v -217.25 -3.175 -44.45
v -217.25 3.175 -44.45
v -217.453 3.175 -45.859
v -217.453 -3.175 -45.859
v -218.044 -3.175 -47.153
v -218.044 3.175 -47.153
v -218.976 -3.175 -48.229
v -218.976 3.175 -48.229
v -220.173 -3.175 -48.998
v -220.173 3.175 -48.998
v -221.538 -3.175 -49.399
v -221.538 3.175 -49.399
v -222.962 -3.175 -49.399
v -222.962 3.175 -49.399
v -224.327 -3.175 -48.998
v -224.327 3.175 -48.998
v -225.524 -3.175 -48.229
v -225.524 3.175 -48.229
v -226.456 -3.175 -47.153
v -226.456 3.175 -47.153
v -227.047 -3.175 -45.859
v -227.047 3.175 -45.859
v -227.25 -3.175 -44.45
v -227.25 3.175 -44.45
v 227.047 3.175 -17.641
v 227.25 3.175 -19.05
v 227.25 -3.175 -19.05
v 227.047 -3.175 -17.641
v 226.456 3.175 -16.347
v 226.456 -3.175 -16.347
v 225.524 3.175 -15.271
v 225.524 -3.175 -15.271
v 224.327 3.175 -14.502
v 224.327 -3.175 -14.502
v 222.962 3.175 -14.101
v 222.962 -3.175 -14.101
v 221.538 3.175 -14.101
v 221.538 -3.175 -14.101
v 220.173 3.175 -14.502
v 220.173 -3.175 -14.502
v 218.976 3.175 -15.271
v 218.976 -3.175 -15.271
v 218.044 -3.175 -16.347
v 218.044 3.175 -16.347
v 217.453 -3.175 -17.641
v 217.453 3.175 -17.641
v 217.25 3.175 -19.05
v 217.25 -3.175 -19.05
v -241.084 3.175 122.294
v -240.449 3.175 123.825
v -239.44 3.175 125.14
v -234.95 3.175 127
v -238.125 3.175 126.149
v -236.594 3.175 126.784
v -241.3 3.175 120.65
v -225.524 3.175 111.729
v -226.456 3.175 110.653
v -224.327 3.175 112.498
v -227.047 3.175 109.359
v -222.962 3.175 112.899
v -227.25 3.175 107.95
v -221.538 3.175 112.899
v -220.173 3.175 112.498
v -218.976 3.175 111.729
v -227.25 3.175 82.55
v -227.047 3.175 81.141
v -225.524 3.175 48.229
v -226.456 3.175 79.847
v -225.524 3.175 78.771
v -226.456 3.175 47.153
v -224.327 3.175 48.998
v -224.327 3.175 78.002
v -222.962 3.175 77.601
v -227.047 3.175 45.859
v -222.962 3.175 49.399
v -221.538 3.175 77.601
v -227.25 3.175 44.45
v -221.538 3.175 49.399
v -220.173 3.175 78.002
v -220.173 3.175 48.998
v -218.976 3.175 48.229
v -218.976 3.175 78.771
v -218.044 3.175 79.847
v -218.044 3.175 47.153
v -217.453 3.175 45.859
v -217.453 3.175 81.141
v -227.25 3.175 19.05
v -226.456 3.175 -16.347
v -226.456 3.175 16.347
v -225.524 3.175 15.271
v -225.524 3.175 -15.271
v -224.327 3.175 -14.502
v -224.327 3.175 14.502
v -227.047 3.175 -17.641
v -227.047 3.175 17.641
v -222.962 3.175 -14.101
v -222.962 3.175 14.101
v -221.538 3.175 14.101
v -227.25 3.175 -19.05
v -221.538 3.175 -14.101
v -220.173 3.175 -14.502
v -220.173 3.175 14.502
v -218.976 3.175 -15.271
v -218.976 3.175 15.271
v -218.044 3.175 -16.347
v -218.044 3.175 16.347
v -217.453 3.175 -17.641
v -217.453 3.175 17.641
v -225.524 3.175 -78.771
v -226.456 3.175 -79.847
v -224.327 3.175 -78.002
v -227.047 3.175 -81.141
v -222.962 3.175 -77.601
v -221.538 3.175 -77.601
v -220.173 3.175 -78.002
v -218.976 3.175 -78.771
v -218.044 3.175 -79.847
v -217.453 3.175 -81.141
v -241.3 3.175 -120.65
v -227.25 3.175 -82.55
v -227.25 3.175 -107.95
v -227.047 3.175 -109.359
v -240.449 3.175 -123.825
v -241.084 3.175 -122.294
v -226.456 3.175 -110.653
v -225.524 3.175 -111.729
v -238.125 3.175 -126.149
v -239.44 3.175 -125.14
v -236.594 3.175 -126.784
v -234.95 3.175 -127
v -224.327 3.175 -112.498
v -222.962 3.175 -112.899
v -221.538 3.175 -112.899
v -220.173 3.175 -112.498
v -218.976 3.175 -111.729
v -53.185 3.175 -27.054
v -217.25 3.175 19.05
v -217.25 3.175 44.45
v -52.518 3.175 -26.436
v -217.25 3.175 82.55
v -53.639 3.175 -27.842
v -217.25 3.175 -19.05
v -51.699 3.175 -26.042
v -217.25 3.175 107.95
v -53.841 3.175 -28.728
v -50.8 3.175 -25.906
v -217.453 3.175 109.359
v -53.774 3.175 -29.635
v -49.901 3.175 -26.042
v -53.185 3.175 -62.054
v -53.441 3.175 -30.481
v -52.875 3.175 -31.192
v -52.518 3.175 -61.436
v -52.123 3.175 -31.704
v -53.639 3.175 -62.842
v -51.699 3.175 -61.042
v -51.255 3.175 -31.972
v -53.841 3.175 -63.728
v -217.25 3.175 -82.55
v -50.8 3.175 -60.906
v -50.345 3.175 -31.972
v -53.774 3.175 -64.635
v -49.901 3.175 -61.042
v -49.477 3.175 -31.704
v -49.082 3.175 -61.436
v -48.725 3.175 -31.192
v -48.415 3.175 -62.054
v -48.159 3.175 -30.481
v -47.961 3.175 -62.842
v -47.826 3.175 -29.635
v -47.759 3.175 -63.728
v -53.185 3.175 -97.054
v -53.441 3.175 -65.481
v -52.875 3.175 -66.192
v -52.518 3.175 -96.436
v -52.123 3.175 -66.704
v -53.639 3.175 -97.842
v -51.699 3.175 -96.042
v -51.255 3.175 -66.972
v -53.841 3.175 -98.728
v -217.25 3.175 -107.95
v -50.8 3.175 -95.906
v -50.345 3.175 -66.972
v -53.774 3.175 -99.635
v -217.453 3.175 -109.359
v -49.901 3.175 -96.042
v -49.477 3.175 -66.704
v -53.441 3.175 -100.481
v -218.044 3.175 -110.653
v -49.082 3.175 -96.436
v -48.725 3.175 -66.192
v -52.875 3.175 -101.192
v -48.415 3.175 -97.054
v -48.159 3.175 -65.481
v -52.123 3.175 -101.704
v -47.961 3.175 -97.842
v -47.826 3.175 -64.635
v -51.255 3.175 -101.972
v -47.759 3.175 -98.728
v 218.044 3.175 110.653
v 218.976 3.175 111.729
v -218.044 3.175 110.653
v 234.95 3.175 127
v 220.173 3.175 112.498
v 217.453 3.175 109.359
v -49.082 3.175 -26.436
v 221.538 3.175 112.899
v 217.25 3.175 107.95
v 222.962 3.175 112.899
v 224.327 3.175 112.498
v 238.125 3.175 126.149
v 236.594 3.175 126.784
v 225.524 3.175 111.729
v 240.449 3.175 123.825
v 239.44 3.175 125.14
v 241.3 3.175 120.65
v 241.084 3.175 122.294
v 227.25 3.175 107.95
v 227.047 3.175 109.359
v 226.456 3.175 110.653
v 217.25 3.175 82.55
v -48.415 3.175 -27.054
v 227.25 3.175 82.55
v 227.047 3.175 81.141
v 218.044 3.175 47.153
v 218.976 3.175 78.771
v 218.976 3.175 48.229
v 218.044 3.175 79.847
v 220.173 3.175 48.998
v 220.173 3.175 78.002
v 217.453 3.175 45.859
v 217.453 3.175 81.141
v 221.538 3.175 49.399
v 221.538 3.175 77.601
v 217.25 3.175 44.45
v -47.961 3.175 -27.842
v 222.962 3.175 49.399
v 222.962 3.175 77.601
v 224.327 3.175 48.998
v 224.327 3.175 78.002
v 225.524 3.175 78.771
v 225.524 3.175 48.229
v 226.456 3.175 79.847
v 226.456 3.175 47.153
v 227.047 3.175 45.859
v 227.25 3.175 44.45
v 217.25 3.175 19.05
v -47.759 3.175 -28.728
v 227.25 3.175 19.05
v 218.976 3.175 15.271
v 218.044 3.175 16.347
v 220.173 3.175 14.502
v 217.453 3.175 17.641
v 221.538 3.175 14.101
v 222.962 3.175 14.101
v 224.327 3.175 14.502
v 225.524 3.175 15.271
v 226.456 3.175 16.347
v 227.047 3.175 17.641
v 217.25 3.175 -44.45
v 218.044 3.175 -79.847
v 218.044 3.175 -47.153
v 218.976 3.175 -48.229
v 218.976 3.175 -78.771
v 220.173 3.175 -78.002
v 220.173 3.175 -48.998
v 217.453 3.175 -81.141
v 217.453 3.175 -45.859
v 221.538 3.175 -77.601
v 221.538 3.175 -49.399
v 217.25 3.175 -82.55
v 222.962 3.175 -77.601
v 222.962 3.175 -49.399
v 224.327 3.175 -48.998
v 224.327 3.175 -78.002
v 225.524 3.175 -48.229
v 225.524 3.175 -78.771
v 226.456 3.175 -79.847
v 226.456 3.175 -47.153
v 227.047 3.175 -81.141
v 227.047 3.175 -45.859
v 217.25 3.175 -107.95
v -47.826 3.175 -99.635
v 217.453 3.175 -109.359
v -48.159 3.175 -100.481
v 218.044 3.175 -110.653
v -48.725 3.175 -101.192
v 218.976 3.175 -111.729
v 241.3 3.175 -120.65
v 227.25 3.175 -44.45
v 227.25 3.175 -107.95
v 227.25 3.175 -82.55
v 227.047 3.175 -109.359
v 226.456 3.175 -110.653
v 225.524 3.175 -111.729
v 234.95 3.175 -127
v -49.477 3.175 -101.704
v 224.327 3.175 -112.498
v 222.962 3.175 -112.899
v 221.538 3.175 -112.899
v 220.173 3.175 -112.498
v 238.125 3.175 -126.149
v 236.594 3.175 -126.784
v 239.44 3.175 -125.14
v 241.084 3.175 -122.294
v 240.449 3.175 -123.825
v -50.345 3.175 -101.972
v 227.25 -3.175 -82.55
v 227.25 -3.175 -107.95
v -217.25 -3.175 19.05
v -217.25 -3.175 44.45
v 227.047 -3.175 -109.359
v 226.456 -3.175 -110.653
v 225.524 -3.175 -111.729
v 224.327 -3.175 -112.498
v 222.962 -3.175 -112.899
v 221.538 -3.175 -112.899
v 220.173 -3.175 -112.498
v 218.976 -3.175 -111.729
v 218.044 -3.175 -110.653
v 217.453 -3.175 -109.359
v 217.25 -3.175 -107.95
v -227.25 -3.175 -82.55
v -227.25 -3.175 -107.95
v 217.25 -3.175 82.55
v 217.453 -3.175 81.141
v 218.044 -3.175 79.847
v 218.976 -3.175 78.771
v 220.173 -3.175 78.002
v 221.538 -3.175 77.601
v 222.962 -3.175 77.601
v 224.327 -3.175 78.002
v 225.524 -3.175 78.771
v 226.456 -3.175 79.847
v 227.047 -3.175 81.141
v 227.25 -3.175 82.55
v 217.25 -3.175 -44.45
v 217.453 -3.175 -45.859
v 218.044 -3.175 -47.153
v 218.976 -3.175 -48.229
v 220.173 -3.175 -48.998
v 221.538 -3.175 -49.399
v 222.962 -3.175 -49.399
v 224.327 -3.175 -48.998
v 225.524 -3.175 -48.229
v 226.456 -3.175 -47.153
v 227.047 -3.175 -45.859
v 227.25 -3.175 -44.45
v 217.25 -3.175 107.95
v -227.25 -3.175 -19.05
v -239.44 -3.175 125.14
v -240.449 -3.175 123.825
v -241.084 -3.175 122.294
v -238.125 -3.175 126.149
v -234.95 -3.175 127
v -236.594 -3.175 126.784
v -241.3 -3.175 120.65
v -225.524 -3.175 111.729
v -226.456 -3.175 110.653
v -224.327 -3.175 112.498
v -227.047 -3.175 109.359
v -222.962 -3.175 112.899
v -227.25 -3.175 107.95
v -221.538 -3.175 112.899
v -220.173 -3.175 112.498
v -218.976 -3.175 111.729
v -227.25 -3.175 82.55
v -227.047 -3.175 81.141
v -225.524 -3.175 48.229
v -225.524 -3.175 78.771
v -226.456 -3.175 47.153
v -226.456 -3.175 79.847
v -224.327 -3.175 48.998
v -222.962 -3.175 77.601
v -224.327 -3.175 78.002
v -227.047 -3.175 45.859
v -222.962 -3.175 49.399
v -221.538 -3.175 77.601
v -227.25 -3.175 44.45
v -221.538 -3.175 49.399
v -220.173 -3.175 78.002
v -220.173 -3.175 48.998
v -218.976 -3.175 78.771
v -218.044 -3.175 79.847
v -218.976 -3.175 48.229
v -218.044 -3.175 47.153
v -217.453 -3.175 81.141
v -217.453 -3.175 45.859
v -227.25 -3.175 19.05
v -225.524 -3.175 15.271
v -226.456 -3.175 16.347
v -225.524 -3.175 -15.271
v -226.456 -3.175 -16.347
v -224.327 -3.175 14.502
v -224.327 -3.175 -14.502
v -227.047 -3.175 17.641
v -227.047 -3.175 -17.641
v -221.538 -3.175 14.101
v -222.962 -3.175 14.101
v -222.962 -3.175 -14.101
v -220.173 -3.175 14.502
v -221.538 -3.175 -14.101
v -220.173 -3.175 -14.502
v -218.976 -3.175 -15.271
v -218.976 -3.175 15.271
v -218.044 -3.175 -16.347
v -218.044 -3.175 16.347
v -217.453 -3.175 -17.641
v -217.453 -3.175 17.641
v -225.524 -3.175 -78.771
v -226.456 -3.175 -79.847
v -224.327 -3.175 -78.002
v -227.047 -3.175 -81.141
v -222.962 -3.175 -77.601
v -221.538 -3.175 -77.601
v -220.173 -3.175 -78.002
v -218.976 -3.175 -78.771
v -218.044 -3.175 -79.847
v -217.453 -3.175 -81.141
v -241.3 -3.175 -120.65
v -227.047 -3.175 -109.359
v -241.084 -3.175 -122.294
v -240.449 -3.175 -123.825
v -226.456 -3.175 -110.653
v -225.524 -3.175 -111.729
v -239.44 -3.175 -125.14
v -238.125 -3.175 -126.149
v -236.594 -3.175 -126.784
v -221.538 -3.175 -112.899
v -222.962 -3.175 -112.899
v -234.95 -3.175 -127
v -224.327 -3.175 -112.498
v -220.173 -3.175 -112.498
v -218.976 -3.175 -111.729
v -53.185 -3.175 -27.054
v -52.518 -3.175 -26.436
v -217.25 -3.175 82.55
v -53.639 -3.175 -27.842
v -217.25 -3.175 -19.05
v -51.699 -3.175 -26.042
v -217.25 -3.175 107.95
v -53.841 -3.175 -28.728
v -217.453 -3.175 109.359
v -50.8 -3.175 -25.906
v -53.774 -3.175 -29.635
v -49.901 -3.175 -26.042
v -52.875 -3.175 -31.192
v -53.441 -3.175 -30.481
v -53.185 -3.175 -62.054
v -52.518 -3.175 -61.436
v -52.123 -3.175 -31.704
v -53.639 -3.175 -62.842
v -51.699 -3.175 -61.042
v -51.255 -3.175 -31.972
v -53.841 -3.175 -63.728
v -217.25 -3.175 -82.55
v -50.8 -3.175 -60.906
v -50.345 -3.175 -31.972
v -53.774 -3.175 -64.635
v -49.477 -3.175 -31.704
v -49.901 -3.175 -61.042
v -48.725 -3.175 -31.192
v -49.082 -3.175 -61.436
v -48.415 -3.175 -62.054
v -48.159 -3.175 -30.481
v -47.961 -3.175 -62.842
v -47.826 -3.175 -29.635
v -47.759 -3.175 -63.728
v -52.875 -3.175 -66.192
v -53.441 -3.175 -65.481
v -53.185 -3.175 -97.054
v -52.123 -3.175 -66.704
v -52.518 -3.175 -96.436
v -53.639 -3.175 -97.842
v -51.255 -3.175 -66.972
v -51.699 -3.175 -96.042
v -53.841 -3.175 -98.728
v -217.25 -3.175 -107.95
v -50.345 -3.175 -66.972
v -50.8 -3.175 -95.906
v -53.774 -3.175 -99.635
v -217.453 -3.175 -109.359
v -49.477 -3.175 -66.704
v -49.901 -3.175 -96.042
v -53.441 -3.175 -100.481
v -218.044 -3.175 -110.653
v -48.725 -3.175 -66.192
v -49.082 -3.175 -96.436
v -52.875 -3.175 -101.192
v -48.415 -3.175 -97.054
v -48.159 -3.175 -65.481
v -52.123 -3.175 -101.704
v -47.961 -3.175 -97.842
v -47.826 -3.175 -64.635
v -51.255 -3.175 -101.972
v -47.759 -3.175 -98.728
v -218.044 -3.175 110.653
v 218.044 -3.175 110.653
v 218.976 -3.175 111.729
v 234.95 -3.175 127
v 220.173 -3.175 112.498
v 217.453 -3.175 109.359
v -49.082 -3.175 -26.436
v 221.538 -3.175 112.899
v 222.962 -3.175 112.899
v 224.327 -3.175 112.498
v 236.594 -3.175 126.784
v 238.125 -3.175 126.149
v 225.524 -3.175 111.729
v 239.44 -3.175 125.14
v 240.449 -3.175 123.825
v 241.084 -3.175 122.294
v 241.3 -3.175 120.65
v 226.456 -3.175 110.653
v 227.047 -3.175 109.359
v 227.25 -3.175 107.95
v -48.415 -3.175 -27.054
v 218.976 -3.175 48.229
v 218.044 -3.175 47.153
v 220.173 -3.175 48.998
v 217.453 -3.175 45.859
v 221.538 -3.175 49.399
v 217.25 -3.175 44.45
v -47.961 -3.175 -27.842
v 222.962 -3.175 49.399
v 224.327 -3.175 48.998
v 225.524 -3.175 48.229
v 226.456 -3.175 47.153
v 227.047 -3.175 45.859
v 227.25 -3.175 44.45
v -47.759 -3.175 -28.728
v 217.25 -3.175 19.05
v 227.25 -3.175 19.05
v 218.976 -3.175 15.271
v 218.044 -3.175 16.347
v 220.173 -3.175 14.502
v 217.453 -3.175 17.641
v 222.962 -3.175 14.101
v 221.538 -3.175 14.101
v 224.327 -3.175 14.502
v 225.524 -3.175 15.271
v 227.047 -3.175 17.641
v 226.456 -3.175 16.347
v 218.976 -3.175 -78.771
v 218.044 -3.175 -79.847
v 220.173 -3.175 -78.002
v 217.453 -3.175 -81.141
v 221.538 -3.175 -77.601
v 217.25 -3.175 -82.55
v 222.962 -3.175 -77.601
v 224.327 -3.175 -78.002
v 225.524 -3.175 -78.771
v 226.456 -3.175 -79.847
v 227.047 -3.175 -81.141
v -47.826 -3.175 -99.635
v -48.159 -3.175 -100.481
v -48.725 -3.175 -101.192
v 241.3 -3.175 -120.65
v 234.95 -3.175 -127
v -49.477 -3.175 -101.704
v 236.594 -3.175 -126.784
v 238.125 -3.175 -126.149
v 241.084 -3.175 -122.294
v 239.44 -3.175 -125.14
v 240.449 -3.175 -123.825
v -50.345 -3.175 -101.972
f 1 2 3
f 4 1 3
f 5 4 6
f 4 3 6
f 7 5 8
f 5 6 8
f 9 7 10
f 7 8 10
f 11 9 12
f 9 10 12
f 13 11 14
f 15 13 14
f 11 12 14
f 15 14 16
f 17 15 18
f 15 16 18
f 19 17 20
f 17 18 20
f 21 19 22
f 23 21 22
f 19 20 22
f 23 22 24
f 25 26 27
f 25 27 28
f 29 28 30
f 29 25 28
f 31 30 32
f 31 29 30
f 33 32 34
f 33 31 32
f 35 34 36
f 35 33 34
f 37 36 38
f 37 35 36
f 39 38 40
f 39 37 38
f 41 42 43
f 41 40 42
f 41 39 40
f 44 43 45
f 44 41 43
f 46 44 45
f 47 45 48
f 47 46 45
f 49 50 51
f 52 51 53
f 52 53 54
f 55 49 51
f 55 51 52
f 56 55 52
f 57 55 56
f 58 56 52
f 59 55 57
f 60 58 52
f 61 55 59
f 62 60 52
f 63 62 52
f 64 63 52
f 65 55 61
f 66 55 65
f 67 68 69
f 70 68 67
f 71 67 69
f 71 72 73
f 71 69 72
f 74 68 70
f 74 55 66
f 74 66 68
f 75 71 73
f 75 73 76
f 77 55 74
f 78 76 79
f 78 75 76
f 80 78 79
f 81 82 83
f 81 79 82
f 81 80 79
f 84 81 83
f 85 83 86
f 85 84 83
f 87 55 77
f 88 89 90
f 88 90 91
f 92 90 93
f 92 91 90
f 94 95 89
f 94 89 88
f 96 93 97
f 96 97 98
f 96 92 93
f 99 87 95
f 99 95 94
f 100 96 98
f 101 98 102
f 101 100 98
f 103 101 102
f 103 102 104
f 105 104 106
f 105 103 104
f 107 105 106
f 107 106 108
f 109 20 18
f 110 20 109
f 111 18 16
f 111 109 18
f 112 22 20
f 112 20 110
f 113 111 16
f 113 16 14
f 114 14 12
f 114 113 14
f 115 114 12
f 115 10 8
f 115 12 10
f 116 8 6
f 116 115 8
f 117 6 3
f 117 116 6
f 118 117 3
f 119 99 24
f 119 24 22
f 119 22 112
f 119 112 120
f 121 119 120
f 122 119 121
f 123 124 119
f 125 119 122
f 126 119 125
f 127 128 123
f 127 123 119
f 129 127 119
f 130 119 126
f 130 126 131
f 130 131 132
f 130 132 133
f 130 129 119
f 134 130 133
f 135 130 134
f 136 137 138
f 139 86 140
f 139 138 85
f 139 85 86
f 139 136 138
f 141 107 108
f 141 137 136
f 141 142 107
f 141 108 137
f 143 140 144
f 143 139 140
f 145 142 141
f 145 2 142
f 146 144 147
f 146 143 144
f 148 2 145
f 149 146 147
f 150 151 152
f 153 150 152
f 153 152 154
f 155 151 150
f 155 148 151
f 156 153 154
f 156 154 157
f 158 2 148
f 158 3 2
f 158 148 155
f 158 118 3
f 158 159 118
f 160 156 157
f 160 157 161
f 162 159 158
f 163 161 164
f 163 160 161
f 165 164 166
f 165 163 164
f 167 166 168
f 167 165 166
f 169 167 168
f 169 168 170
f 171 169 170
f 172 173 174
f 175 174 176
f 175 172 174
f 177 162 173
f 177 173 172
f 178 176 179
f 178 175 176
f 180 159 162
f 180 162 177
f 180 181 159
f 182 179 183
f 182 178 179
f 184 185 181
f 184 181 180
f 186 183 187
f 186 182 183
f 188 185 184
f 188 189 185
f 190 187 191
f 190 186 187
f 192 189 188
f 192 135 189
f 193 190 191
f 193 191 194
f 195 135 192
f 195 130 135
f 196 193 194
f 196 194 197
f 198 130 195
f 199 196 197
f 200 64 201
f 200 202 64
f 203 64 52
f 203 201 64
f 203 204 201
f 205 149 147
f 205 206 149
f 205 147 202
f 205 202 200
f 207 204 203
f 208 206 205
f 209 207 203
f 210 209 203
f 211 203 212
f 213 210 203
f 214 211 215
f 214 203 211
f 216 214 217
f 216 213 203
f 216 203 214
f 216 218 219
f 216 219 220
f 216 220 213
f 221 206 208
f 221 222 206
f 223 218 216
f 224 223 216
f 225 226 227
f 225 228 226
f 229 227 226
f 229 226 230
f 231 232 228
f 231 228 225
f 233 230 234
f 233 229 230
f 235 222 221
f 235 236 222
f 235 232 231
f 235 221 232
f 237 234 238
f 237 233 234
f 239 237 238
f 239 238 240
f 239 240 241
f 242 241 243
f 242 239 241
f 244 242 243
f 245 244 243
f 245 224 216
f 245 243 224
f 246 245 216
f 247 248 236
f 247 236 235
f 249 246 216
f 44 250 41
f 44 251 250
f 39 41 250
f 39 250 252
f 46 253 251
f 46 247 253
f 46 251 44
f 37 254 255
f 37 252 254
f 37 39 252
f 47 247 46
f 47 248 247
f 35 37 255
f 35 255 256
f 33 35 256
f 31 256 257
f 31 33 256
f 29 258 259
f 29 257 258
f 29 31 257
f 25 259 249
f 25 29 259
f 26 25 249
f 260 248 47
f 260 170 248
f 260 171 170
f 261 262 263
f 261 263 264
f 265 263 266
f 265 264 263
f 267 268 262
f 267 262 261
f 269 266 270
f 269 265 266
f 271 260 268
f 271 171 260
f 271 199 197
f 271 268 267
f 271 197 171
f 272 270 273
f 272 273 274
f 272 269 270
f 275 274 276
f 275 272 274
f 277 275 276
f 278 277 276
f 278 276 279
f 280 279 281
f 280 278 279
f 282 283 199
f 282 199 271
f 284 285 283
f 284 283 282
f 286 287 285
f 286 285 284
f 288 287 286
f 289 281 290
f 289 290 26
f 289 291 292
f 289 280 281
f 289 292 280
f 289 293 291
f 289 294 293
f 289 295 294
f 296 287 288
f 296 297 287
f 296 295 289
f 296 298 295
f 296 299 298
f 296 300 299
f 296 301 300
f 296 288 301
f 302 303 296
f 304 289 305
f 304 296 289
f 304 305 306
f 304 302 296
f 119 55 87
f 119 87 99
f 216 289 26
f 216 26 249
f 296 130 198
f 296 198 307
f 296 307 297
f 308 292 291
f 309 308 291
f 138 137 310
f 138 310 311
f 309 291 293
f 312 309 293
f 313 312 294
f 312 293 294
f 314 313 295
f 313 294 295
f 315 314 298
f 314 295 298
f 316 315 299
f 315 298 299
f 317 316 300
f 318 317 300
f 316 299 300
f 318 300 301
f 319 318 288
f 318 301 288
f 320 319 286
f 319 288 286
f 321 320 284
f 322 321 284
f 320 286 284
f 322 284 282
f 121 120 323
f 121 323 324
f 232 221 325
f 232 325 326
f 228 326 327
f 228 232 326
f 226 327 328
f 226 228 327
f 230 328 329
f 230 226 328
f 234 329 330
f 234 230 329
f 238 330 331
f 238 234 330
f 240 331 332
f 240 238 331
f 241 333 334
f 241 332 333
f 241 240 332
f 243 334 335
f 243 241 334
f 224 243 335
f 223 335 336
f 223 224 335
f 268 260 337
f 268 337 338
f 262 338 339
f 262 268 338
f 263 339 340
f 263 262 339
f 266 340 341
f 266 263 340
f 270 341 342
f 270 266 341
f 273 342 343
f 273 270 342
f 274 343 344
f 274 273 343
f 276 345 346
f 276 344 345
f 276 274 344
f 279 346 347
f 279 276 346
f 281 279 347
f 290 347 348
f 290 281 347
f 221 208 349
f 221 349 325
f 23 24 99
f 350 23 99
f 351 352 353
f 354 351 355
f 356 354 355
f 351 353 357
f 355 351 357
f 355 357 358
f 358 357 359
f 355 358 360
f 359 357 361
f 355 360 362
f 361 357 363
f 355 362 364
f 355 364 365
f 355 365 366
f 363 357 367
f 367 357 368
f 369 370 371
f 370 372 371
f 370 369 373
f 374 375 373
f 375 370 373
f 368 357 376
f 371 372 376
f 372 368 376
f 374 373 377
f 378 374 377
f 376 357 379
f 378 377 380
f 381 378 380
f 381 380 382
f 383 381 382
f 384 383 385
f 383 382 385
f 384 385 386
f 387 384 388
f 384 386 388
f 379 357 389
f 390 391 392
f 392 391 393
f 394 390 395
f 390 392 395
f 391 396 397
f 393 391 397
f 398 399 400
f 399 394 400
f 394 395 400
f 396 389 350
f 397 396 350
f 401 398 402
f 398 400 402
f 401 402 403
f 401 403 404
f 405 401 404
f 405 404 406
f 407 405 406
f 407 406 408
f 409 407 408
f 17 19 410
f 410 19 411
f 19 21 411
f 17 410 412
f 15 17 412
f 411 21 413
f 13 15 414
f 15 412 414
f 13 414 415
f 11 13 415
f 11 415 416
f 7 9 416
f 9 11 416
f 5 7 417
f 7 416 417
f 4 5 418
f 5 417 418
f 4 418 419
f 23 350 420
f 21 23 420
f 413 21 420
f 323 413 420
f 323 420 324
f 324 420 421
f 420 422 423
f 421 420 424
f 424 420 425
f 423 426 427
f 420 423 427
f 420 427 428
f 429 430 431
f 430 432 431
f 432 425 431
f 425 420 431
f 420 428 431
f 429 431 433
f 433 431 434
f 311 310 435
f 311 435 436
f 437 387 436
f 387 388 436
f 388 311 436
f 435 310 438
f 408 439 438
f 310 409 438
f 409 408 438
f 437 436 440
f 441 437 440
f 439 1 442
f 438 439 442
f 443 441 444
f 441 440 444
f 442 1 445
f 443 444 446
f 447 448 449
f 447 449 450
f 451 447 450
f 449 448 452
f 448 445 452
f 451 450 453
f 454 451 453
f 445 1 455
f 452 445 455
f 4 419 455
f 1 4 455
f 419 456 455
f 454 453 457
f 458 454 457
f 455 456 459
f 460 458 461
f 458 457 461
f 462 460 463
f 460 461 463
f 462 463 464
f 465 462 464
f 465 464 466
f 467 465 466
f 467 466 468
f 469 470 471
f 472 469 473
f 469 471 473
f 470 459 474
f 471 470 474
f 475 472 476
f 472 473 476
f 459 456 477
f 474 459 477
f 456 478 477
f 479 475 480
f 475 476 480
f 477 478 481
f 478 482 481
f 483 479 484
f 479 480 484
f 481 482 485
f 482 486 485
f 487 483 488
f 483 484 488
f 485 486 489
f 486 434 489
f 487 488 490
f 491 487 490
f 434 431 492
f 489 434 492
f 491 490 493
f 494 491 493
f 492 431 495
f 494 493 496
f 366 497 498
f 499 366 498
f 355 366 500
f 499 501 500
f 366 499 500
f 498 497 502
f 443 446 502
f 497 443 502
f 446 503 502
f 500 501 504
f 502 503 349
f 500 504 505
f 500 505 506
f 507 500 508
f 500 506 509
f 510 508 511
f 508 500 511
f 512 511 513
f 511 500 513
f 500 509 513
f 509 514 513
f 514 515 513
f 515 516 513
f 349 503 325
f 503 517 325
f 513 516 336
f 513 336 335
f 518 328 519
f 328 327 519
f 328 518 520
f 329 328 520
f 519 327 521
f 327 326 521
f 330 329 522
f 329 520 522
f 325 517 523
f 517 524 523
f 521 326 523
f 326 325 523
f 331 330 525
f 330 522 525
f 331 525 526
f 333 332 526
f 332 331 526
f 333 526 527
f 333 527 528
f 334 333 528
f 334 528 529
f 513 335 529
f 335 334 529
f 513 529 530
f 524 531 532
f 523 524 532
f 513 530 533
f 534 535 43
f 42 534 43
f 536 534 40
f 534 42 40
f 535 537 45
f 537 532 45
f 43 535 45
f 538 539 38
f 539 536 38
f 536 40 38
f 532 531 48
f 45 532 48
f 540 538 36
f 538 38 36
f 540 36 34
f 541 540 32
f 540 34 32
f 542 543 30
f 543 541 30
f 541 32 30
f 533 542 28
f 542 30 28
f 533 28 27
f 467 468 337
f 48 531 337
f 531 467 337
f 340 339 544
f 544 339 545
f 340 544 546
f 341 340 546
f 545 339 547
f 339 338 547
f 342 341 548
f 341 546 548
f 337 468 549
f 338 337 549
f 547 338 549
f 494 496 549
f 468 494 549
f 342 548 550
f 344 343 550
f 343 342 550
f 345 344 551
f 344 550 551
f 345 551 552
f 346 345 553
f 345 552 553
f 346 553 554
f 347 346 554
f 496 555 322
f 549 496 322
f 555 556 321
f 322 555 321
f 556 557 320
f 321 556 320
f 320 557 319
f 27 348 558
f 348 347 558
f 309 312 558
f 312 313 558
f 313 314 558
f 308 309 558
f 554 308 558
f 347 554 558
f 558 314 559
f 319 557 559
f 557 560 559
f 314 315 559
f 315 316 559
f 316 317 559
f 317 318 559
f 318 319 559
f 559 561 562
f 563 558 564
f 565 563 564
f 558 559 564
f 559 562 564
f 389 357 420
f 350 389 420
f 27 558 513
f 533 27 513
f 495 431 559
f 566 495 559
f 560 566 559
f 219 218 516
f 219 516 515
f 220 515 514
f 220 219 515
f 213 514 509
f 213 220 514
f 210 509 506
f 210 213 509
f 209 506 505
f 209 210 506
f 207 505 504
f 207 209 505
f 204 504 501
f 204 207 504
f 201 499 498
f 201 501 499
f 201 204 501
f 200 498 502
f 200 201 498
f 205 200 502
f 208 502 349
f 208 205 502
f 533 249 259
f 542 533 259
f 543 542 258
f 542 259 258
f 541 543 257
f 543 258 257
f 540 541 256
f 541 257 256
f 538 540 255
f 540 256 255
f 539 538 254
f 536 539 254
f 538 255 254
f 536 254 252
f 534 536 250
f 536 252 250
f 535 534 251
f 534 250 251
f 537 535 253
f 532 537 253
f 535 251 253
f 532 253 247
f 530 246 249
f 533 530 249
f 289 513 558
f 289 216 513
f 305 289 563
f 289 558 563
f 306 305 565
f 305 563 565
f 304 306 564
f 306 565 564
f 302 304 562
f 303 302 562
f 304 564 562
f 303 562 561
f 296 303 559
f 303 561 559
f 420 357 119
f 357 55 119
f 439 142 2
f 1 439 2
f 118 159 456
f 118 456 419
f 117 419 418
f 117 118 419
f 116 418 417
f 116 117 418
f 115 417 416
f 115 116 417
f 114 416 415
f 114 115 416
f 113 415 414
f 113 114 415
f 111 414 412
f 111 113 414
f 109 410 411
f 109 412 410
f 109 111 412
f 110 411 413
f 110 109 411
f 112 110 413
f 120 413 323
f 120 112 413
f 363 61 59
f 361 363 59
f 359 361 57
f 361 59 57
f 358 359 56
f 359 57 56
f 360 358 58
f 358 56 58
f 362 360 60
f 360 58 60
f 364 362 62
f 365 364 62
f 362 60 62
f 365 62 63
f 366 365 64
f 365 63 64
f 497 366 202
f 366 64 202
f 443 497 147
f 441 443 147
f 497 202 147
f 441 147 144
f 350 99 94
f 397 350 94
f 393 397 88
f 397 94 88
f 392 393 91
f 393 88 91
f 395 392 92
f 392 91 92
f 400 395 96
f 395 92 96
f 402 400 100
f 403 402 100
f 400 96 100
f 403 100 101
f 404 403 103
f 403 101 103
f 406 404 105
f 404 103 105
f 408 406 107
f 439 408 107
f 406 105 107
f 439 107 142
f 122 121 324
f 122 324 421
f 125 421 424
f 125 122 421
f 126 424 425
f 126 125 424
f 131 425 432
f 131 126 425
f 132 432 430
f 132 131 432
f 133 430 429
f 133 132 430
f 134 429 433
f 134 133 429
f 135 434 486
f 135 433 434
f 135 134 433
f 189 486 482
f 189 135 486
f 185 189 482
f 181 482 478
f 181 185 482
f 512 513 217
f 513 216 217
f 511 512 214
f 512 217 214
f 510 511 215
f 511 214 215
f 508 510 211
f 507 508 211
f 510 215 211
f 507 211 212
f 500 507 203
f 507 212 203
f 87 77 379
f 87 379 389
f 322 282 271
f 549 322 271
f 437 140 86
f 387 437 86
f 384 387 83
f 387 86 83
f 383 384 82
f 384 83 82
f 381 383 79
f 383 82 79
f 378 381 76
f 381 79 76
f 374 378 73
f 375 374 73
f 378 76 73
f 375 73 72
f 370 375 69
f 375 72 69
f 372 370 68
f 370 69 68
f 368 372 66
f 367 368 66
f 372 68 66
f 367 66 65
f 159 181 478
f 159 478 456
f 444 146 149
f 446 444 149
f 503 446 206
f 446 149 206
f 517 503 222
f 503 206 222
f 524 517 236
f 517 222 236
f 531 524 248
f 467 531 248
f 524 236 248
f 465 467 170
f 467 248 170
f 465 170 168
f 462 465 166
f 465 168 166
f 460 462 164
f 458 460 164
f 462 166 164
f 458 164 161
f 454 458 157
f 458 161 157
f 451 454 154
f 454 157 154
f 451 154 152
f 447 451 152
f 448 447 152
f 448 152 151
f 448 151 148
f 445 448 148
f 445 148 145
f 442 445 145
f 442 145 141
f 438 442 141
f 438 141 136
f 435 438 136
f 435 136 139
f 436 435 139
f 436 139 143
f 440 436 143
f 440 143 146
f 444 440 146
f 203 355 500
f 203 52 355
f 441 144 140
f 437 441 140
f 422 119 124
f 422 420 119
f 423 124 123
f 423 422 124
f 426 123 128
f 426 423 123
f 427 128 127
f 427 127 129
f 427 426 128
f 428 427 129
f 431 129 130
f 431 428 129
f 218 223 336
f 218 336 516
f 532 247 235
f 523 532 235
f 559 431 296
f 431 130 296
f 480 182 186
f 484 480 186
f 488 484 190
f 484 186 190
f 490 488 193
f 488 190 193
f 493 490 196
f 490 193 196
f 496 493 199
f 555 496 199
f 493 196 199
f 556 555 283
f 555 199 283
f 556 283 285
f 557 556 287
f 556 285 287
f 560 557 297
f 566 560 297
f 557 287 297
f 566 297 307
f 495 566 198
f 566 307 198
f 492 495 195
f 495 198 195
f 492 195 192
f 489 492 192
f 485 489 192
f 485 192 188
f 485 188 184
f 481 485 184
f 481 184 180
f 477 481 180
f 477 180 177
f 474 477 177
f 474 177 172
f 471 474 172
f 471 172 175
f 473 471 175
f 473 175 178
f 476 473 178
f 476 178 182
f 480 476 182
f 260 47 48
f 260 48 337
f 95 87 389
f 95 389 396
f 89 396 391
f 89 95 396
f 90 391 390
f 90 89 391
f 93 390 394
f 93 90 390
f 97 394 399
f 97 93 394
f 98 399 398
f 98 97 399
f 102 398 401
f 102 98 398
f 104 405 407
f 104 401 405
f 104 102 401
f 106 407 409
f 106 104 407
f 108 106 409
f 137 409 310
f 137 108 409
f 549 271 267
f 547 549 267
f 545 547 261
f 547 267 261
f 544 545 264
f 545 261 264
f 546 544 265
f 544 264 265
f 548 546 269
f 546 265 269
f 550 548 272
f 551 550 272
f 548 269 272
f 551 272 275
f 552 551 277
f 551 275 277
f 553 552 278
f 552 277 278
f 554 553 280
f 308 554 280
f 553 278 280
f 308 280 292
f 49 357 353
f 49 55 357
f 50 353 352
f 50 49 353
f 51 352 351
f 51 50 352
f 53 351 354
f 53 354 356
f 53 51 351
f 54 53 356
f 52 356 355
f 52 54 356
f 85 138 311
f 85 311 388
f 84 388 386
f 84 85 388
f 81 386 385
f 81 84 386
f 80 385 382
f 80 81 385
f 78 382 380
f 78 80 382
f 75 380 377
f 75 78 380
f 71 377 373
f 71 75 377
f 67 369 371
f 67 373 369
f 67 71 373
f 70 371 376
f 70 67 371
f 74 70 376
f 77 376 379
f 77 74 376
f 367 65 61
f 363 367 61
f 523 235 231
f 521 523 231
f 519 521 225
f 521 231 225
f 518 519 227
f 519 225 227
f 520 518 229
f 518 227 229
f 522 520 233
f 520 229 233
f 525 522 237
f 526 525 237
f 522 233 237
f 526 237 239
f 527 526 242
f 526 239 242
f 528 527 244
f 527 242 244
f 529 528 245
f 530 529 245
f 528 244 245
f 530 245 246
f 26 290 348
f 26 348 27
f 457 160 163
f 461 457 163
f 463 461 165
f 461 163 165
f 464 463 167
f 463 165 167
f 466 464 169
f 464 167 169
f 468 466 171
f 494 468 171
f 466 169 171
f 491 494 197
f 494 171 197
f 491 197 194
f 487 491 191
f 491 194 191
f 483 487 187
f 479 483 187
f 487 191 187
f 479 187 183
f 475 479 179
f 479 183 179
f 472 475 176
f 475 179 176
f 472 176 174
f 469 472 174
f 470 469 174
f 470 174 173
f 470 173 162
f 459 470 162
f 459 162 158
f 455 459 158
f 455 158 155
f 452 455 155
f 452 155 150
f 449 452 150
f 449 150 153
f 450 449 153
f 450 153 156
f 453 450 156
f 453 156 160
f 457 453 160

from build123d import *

# Parameters (mm, degrees)
SKETCH1_W           = 482.6
SKETCH1_H           = 254
BOSS_EXTRUDE1_DEPTH = 3.175
FILLET1_R           = 6.35
CUT_EXTRUDE1_REACH  = 274.754
SKETCH3_R           = 3.05
CUT_EXTRUDE2_DEPTH  = 273.754491255


with BuildPart() as part:
    # Sketch1 → Boss-Extrude1 (new, symmetric)
    with BuildSketch(Plane(origin=(0, 0, 0), x_dir=(1, 0, 0), z_dir=(0, 1, 0))):
        Rectangle(SKETCH1_W, SKETCH1_H)
    extrude(amount=BOSS_EXTRUDE1_DEPTH, both=True)

    # Fillet1
    fillet1_edges = [part.edges().sort_by_distance(p)[0] for p in [
        (241.3, 0, 127),
        (-241.3, 0, 127),
        (-241.3, 0, -127),
        (241.3, 0, -127),
    ]]
    fillet(fillet1_edges, radius=FILLET1_R)

    # Sketch2 → Cut-Extrude1 (cut, up to next)
    with BuildSketch(Plane(origin=(0, 3.175, 0), x_dir=(1, 0, 0), z_dir=(0, 1, 0)), mode=Mode.PRIVATE) as cut_extrude1_sk1:
        with BuildLine():
            Line((227.25, -82.55), (227.25, -107.95))
            ThreePointArc((227.25, -107.95), (222.25, -112.95), (217.25, -107.95))
            Line((217.25, -107.95), (217.25, -82.55))
            ThreePointArc((217.25, -82.55), (222.25, -77.55), (227.25, -82.55))
        make_face()
    cut_extrude1_tool1 = extrude(cut_extrude1_sk1.sketch, amount=-CUT_EXTRUDE1_REACH, mode=Mode.PRIVATE) & part.part
    # Sketch2 → Cut-Extrude1 (cut, up to next)
    with BuildSketch(Plane(origin=(0, 3.175, 0), x_dir=(1, 0, 0), z_dir=(0, 1, 0)), mode=Mode.PRIVATE) as cut_extrude1_sk2:
        with BuildLine():
            Line((227.25, -44.45), (227.25, -19.05))
            ThreePointArc((227.25, -19.05), (222.25, -14.05), (217.25, -19.05))
            Line((217.25, -19.05), (217.25, -44.45))
            ThreePointArc((217.25, -44.45), (222.25, -49.45), (227.25, -44.45))
        make_face()
    cut_extrude1_tool2 = extrude(cut_extrude1_sk2.sketch, amount=-CUT_EXTRUDE1_REACH, mode=Mode.PRIVATE) & part.part
    # Sketch2 → Cut-Extrude1 (cut, up to next)
    with BuildSketch(Plane(origin=(0, 3.175, 0), x_dir=(1, 0, 0), z_dir=(0, 1, 0)), mode=Mode.PRIVATE) as cut_extrude1_sk3:
        with BuildLine():
            Line((227.25, 44.45), (227.25, 19.05))
            ThreePointArc((227.25, 19.05), (222.25, 14.05), (217.25, 19.05))
            Line((217.25, 19.05), (217.25, 44.45))
            ThreePointArc((217.25, 44.45), (222.25, 49.45), (227.25, 44.45))
        make_face()
    cut_extrude1_tool3 = extrude(cut_extrude1_sk3.sketch, amount=-CUT_EXTRUDE1_REACH, mode=Mode.PRIVATE) & part.part
    # Sketch2 → Cut-Extrude1 (cut, up to next)
    with BuildSketch(Plane(origin=(0, 3.175, 0), x_dir=(1, 0, 0), z_dir=(0, 1, 0)), mode=Mode.PRIVATE) as cut_extrude1_sk4:
        with BuildLine():
            Line((227.25, 82.55), (227.25, 107.95))
            ThreePointArc((227.25, 107.95), (222.25, 112.95), (217.25, 107.95))
            Line((217.25, 107.95), (217.25, 82.55))
            ThreePointArc((217.25, 82.55), (222.25, 77.55), (227.25, 82.55))
        make_face()
    cut_extrude1_tool4 = extrude(cut_extrude1_sk4.sketch, amount=-CUT_EXTRUDE1_REACH, mode=Mode.PRIVATE) & part.part
    # Sketch2 → Cut-Extrude1 (cut, up to next)
    with BuildSketch(Plane(origin=(0, 3.175, 0), x_dir=(1, 0, 0), z_dir=(0, 1, 0)), mode=Mode.PRIVATE) as cut_extrude1_sk5:
        with BuildLine():
            Line((-227.25, 82.55), (-227.25, 107.95))
            ThreePointArc((-227.25, 107.95), (-222.25, 112.95), (-217.25, 107.95))
            Line((-217.25, 107.95), (-217.25, 82.55))
            ThreePointArc((-217.25, 82.55), (-222.25, 77.55), (-227.25, 82.55))
        make_face()
    cut_extrude1_tool5 = extrude(cut_extrude1_sk5.sketch, amount=-CUT_EXTRUDE1_REACH, mode=Mode.PRIVATE) & part.part
    # Sketch2 → Cut-Extrude1 (cut, up to next)
    with BuildSketch(Plane(origin=(0, 3.175, 0), x_dir=(1, 0, 0), z_dir=(0, 1, 0)), mode=Mode.PRIVATE) as cut_extrude1_sk6:
        with BuildLine():
            Line((-227.25, 44.45), (-227.25, 19.05))
            ThreePointArc((-227.25, 19.05), (-222.25, 14.05), (-217.25, 19.05))
            Line((-217.25, 19.05), (-217.25, 44.45))
            ThreePointArc((-217.25, 44.45), (-222.25, 49.45), (-227.25, 44.45))
        make_face()
    cut_extrude1_tool6 = extrude(cut_extrude1_sk6.sketch, amount=-CUT_EXTRUDE1_REACH, mode=Mode.PRIVATE) & part.part
    # Sketch2 → Cut-Extrude1 (cut, up to next)
    with BuildSketch(Plane(origin=(0, 3.175, 0), x_dir=(1, 0, 0), z_dir=(0, 1, 0)), mode=Mode.PRIVATE) as cut_extrude1_sk7:
        with BuildLine():
            Line((-227.25, -44.45), (-227.25, -19.05))
            ThreePointArc((-227.25, -19.05), (-222.25, -14.05), (-217.25, -19.05))
            Line((-217.25, -19.05), (-217.25, -44.45))
            ThreePointArc((-217.25, -44.45), (-222.25, -49.45), (-227.25, -44.45))
        make_face()
    cut_extrude1_tool7 = extrude(cut_extrude1_sk7.sketch, amount=-CUT_EXTRUDE1_REACH, mode=Mode.PRIVATE) & part.part
    # Sketch2 → Cut-Extrude1 (cut, up to next)
    with BuildSketch(Plane(origin=(0, 3.175, 0), x_dir=(1, 0, 0), z_dir=(0, 1, 0)), mode=Mode.PRIVATE) as cut_extrude1_sk8:
        with BuildLine():
            Line((-227.25, -82.55), (-227.25, -107.95))
            ThreePointArc((-227.25, -107.95), (-222.25, -112.95), (-217.25, -107.95))
            Line((-217.25, -107.95), (-217.25, -82.55))
            ThreePointArc((-217.25, -82.55), (-222.25, -77.55), (-227.25, -82.55))
        make_face()
    cut_extrude1_tool8 = extrude(cut_extrude1_sk8.sketch, amount=-CUT_EXTRUDE1_REACH, mode=Mode.PRIVATE) & part.part
    add(cut_extrude1_tool1.solids().sort_by_distance((222.25, 3.175, 95.25))[0], mode=Mode.SUBTRACT)
    add(cut_extrude1_tool2.solids().sort_by_distance((222.25, 3.175, 31.75))[0], mode=Mode.SUBTRACT)
    add(cut_extrude1_tool3.solids().sort_by_distance((222.25, 3.175, -31.75))[0], mode=Mode.SUBTRACT)
    add(cut_extrude1_tool4.solids().sort_by_distance((222.25, 3.175, -95.25))[0], mode=Mode.SUBTRACT)
    add(cut_extrude1_tool5.solids().sort_by_distance((-222.25, 3.175, -95.25))[0], mode=Mode.SUBTRACT)
    add(cut_extrude1_tool6.solids().sort_by_distance((-222.25, 3.175, -31.75))[0], mode=Mode.SUBTRACT)
    add(cut_extrude1_tool7.solids().sort_by_distance((-222.25, 3.175, 31.75))[0], mode=Mode.SUBTRACT)
    add(cut_extrude1_tool8.solids().sort_by_distance((-222.25, 3.175, 95.25))[0], mode=Mode.SUBTRACT)

    # Sketch3 → Cut-Extrude2 (cut, through all)
    with BuildSketch(Plane(origin=(0, 3.175, 0), x_dir=(1, 0, 0), z_dir=(0, 1, 0))):
        with Locations(Location((-50.8, 98.956, 0), (0, 0, 270))):
            Circle(SKETCH3_R)
        with Locations(Location((-50.8, 63.956, 0), (0, 0, 270))):
            Circle(SKETCH3_R)
        with Locations(Location((-50.8, 28.956, 0), (0, 0, 270))):
            Circle(SKETCH3_R)
    extrude(amount=-CUT_EXTRUDE2_DEPTH, mode=Mode.SUBTRACT)


solid = part.part
